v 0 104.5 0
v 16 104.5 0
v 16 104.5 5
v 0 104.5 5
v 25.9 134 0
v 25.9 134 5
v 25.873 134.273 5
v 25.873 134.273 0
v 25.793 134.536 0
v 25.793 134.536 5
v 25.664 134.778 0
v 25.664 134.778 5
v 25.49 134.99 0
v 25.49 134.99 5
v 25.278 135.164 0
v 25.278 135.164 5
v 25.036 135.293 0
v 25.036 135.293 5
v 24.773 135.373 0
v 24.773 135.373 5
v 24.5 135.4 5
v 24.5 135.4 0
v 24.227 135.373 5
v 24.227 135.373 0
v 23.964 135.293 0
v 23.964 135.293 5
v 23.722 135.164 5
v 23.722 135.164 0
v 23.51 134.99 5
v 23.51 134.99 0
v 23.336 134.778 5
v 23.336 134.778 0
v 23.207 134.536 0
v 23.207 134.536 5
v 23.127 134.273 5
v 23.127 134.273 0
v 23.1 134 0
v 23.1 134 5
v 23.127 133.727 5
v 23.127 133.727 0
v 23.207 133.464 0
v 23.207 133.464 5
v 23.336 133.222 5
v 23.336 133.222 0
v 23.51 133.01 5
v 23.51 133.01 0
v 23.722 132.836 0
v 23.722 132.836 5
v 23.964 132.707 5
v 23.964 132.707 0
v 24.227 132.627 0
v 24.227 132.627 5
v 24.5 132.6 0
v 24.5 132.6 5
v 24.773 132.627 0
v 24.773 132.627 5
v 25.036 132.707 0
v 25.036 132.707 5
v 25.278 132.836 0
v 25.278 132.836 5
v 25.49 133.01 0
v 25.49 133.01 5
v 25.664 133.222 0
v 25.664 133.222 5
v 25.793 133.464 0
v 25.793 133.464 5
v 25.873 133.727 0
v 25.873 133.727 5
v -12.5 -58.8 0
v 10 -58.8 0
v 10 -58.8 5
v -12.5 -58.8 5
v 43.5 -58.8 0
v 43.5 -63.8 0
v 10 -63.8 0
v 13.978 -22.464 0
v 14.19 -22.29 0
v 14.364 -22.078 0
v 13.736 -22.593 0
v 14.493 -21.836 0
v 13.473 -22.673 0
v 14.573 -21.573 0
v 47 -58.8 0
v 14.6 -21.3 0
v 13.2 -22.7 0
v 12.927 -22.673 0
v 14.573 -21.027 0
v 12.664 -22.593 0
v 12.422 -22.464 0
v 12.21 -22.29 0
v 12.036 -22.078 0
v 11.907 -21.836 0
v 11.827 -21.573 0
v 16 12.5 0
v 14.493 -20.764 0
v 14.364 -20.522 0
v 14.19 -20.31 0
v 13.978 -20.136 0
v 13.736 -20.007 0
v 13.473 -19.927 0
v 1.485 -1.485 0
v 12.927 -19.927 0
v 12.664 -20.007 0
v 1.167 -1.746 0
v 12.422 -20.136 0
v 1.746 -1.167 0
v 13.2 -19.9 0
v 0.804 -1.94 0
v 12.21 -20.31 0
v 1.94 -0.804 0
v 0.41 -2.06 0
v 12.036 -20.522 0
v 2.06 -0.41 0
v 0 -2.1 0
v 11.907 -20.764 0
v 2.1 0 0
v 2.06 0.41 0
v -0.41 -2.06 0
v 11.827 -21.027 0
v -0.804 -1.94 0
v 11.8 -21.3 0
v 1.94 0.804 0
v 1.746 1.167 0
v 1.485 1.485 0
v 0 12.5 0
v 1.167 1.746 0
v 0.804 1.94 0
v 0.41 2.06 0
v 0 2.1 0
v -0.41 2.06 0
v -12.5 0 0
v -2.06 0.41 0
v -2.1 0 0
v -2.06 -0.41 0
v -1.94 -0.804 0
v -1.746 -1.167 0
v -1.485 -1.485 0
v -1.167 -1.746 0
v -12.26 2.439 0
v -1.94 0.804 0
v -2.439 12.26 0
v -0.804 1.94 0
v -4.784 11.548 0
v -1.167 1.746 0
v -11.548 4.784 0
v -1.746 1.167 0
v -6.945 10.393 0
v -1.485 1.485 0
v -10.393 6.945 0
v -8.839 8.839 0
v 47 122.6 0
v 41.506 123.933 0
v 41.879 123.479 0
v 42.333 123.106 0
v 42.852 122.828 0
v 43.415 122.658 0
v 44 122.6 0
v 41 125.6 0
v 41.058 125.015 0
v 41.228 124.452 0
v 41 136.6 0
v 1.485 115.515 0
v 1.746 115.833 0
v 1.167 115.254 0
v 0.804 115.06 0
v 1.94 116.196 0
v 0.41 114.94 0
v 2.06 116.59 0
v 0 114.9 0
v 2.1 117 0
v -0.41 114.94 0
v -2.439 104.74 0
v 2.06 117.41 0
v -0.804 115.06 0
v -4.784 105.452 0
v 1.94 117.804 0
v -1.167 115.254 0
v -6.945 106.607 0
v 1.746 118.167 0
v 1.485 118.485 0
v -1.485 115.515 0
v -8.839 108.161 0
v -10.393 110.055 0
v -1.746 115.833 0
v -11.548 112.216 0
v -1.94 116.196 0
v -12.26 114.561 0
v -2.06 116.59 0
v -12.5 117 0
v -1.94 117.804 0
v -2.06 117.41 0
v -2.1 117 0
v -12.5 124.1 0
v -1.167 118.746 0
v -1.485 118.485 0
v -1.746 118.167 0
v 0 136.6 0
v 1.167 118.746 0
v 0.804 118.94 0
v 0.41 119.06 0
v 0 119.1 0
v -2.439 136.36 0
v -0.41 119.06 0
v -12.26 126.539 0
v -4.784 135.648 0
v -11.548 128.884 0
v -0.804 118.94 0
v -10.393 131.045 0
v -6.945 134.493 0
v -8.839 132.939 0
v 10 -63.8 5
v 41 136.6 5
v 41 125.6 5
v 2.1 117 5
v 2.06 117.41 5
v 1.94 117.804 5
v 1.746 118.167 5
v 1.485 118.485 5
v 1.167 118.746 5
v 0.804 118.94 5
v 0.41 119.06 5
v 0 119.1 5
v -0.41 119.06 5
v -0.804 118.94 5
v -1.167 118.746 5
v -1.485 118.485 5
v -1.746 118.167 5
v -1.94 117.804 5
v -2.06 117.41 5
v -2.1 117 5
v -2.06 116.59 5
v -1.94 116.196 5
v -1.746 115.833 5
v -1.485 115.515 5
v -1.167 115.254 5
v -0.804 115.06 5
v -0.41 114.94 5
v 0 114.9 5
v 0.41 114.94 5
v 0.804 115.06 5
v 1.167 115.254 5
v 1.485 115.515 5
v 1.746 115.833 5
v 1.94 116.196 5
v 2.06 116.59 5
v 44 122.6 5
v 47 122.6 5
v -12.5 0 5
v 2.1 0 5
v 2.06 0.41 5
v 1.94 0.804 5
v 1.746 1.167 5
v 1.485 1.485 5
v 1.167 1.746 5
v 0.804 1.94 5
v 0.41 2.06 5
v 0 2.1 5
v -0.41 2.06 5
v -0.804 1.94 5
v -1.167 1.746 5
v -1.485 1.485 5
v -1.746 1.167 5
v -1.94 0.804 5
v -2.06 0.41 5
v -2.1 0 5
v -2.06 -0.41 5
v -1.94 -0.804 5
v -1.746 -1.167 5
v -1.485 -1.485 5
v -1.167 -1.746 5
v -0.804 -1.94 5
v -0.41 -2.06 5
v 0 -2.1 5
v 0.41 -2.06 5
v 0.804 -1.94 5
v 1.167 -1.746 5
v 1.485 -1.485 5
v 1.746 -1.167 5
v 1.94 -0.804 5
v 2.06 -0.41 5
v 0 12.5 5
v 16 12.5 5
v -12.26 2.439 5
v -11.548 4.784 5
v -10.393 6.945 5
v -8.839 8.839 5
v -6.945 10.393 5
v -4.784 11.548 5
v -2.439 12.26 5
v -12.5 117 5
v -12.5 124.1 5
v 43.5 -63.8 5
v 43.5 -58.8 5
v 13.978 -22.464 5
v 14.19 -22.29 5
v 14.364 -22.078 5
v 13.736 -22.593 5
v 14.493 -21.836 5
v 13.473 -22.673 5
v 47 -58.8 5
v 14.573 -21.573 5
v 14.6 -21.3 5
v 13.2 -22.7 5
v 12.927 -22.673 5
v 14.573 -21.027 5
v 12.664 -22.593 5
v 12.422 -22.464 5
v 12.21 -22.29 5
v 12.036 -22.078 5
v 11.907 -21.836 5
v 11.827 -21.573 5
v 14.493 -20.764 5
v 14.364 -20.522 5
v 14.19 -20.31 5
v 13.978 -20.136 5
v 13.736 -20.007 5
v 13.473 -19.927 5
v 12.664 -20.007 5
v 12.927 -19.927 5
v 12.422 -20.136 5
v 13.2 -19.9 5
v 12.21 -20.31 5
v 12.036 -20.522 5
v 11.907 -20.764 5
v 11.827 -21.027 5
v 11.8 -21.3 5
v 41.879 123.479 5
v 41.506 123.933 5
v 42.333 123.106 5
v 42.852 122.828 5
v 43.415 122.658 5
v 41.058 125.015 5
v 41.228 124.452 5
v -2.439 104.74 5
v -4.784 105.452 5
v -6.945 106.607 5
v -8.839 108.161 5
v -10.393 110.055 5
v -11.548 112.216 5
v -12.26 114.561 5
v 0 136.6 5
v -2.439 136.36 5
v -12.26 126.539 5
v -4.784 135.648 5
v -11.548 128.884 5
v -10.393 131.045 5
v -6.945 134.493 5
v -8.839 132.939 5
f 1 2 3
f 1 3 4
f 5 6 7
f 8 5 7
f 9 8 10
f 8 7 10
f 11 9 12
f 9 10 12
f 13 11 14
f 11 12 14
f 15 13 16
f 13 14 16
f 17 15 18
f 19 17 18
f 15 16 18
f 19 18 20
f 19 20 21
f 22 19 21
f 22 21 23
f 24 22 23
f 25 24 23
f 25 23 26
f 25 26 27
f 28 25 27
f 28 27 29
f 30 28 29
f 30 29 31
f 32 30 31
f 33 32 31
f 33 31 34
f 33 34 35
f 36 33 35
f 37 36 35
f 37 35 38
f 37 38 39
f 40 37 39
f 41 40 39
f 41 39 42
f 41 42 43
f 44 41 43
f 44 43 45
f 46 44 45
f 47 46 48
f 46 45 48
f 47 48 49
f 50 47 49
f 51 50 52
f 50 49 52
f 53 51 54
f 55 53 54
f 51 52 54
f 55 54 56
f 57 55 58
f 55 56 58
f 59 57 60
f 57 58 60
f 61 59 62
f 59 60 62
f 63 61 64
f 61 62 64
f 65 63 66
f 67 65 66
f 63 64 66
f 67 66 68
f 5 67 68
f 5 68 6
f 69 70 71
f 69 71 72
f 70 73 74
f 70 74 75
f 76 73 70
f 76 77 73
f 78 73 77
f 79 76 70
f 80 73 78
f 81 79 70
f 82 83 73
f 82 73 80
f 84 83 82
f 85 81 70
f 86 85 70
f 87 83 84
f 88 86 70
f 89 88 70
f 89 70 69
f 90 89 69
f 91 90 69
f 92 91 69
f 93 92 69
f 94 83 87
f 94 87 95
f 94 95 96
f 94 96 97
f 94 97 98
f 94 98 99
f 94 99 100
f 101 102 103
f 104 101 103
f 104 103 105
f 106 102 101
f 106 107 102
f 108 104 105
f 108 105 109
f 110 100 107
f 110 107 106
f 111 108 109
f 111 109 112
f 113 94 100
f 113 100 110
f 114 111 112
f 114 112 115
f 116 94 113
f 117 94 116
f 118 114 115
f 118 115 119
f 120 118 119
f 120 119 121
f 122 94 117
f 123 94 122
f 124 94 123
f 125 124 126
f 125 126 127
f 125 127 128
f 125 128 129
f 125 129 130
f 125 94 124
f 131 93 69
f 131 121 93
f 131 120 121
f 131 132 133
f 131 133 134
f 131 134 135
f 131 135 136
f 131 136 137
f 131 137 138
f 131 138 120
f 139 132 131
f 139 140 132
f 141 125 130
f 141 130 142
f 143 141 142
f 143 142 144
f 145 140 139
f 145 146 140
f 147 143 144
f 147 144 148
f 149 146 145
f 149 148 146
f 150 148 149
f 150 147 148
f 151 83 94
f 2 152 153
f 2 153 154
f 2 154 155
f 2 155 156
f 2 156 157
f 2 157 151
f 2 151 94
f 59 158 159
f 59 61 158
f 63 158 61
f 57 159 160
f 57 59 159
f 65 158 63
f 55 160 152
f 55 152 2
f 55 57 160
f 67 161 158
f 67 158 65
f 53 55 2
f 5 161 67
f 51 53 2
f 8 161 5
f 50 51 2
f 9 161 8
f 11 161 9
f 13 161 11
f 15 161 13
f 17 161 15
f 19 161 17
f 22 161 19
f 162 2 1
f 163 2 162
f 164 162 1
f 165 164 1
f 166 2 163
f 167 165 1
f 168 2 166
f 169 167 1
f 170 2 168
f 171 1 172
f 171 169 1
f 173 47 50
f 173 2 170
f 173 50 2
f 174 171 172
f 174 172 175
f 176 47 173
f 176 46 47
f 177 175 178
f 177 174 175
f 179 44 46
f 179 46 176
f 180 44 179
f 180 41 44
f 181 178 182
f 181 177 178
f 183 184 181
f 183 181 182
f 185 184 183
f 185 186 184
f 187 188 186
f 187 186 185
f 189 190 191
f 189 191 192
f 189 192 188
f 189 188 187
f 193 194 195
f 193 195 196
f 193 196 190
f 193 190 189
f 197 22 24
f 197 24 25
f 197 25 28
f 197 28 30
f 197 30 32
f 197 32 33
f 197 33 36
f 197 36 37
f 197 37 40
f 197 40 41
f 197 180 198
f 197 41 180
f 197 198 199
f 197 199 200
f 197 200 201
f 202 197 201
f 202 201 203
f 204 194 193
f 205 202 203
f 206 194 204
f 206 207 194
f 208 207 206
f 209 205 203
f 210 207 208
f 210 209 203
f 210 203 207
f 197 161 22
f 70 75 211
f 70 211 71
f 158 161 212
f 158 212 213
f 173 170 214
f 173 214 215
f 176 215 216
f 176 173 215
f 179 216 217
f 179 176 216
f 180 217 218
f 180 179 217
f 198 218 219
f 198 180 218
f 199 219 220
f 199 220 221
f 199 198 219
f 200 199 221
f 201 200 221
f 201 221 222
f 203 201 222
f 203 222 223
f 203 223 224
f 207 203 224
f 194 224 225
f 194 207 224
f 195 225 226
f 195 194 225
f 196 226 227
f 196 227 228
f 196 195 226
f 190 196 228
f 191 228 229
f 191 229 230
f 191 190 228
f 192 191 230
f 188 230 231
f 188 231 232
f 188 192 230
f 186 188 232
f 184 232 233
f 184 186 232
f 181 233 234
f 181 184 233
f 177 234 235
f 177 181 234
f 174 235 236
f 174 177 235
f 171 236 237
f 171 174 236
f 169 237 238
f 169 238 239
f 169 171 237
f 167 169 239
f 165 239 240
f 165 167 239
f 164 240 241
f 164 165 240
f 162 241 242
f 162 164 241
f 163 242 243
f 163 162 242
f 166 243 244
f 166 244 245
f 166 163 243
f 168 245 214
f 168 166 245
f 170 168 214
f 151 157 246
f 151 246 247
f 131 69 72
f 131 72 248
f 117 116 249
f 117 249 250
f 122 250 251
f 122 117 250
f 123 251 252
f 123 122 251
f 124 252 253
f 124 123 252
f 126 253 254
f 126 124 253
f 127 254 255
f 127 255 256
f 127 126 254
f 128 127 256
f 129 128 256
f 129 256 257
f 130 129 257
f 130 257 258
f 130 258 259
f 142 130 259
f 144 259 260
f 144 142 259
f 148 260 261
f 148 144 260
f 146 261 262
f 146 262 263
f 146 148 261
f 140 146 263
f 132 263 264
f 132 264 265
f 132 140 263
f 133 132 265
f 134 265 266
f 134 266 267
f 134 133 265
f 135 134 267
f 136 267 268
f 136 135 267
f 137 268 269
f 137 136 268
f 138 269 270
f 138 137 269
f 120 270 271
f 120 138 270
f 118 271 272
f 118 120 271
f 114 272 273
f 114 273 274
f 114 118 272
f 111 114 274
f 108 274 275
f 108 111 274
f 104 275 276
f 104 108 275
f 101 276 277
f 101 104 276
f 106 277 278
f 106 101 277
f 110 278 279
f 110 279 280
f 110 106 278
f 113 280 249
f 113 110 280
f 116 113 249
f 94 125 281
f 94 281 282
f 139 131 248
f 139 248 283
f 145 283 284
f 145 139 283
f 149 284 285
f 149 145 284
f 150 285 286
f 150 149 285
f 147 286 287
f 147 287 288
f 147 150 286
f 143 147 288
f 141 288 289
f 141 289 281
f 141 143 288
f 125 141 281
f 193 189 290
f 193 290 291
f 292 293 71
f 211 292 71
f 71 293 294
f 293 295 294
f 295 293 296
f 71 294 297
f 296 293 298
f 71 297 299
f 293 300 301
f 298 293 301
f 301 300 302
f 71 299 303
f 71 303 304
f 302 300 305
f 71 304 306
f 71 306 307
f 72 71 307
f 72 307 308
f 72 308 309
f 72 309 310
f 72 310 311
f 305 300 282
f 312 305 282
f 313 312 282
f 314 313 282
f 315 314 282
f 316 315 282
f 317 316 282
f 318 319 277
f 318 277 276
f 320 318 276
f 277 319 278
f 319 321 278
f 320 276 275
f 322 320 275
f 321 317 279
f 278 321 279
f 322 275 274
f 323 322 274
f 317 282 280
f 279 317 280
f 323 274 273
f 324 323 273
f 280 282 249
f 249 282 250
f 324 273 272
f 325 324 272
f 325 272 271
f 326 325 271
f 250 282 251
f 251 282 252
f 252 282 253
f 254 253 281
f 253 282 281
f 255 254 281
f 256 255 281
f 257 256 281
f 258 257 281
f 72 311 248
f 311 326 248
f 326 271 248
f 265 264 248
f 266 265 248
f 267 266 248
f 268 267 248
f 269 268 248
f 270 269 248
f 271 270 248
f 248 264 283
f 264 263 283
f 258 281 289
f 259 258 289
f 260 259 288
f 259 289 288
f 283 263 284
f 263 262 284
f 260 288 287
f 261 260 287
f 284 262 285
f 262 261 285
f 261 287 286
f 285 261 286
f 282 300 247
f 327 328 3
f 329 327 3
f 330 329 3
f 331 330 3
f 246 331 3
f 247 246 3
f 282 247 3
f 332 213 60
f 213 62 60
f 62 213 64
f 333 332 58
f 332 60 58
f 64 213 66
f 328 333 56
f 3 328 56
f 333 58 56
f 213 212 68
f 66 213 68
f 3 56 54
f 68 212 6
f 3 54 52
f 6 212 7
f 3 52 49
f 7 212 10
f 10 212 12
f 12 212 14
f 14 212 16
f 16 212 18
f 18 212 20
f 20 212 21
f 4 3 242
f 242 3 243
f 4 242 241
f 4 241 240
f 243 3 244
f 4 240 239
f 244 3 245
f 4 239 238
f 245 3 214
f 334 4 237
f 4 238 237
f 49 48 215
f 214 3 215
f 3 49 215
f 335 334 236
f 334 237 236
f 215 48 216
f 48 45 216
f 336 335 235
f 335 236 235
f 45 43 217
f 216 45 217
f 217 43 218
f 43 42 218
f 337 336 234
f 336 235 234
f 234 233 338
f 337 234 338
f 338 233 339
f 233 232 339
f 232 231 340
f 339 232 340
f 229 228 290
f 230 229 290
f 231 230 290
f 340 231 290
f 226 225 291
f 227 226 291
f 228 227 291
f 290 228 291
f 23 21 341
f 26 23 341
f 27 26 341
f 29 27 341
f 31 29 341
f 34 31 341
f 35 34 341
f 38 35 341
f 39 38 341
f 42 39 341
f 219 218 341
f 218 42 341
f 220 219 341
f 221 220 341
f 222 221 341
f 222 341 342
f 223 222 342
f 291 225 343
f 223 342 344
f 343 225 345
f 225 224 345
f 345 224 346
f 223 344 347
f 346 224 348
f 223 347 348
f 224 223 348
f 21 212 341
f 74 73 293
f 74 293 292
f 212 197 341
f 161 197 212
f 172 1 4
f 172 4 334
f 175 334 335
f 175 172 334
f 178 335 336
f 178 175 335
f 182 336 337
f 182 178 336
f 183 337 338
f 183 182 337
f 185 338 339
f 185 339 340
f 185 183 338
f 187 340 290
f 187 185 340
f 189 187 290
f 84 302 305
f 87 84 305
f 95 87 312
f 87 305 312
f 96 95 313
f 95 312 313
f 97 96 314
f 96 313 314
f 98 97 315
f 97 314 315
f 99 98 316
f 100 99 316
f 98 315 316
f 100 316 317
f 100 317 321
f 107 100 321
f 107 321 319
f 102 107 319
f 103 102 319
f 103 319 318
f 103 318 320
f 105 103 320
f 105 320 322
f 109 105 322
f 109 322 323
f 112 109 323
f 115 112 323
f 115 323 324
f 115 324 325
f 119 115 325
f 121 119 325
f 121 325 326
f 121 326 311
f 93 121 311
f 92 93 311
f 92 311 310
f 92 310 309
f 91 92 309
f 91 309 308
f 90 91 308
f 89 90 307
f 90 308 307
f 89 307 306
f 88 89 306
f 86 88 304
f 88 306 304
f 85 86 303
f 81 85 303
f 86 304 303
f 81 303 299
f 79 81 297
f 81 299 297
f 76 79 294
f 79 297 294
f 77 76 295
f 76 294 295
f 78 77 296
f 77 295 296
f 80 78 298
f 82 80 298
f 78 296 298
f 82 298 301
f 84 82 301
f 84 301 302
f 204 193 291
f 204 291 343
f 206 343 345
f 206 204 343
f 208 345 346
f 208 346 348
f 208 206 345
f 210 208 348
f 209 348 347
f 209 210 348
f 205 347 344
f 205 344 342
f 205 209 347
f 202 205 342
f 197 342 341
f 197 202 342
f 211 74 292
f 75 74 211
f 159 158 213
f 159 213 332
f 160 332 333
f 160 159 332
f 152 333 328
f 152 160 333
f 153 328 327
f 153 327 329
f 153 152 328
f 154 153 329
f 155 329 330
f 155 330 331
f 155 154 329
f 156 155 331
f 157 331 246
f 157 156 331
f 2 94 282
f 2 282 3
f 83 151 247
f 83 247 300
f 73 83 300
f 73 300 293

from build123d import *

# Parameters (mm, degrees)
SKETCH1_R           = 2.1
BOSS_EXTRUDE1_DEPTH = 5
SKETCH2_R           = 1.4
CUT_EXTRUDE1_DEPTH  = 145.546048026


with BuildPart() as part:
    # Sketch1 → Boss-Extrude1 (new body)
    with BuildSketch(Plane.XY):
        with BuildLine():
            Line((41, 136.6), (41, 125.6))
            ThreePointArc((41, 125.6), (41.878679656, 123.478679656), (44, 122.6))
            Line((44, 122.6), (47, 122.6))
            Line((47, 122.6), (47, -29.8))
            Line((47, -29.8), (47, -58.8))
            Line((47, -58.8), (43.5, -58.8))
            Line((43.5, -58.8), (43.5, -63.8))
            Line((43.5, -63.8), (10, -63.8))
            Line((10, -63.8), (10, -58.8))
            Line((10, -58.8), (-12.5, -58.8))
            Line((-12.5, -58.8), (-12.5, 0))
            ThreePointArc((-12.5, 0), (-8.838834765, 8.838834765), (0, 12.5))
            Line((0, 12.5), (16, 12.5))
            Line((16, 12.5), (16, 104.5))
            Line((16, 104.5), (0, 104.5))
            ThreePointArc((0, 104.5), (-8.838834765, 108.161165235), (-12.5, 117))
            Line((-12.5, 117), (-12.5, 124.1))
            ThreePointArc((-12.5, 124.1), (-8.838834765, 132.938834765), (0, 136.6))
            Line((0, 136.6), (37.5, 136.6))
            Line((37.5, 136.6), (41, 136.6))
        make_face()
        Circle(SKETCH1_R, mode=Mode.SUBTRACT)
        with Locations((0, 117)):
            Circle(SKETCH1_R, mode=Mode.SUBTRACT)
    extrude(amount=BOSS_EXTRUDE1_DEPTH)

    # Sketch2 → Cut-Extrude1 (cut, through all)
    with BuildSketch(Plane.XY.offset(5)):
        with Locations((13.2, -21.3)):
            Circle(SKETCH2_R)
        with Locations((24.5, 134)):
            Circle(SKETCH2_R)
    extrude(amount=-CUT_EXTRUDE1_DEPTH, mode=Mode.SUBTRACT)


solid = part.part
